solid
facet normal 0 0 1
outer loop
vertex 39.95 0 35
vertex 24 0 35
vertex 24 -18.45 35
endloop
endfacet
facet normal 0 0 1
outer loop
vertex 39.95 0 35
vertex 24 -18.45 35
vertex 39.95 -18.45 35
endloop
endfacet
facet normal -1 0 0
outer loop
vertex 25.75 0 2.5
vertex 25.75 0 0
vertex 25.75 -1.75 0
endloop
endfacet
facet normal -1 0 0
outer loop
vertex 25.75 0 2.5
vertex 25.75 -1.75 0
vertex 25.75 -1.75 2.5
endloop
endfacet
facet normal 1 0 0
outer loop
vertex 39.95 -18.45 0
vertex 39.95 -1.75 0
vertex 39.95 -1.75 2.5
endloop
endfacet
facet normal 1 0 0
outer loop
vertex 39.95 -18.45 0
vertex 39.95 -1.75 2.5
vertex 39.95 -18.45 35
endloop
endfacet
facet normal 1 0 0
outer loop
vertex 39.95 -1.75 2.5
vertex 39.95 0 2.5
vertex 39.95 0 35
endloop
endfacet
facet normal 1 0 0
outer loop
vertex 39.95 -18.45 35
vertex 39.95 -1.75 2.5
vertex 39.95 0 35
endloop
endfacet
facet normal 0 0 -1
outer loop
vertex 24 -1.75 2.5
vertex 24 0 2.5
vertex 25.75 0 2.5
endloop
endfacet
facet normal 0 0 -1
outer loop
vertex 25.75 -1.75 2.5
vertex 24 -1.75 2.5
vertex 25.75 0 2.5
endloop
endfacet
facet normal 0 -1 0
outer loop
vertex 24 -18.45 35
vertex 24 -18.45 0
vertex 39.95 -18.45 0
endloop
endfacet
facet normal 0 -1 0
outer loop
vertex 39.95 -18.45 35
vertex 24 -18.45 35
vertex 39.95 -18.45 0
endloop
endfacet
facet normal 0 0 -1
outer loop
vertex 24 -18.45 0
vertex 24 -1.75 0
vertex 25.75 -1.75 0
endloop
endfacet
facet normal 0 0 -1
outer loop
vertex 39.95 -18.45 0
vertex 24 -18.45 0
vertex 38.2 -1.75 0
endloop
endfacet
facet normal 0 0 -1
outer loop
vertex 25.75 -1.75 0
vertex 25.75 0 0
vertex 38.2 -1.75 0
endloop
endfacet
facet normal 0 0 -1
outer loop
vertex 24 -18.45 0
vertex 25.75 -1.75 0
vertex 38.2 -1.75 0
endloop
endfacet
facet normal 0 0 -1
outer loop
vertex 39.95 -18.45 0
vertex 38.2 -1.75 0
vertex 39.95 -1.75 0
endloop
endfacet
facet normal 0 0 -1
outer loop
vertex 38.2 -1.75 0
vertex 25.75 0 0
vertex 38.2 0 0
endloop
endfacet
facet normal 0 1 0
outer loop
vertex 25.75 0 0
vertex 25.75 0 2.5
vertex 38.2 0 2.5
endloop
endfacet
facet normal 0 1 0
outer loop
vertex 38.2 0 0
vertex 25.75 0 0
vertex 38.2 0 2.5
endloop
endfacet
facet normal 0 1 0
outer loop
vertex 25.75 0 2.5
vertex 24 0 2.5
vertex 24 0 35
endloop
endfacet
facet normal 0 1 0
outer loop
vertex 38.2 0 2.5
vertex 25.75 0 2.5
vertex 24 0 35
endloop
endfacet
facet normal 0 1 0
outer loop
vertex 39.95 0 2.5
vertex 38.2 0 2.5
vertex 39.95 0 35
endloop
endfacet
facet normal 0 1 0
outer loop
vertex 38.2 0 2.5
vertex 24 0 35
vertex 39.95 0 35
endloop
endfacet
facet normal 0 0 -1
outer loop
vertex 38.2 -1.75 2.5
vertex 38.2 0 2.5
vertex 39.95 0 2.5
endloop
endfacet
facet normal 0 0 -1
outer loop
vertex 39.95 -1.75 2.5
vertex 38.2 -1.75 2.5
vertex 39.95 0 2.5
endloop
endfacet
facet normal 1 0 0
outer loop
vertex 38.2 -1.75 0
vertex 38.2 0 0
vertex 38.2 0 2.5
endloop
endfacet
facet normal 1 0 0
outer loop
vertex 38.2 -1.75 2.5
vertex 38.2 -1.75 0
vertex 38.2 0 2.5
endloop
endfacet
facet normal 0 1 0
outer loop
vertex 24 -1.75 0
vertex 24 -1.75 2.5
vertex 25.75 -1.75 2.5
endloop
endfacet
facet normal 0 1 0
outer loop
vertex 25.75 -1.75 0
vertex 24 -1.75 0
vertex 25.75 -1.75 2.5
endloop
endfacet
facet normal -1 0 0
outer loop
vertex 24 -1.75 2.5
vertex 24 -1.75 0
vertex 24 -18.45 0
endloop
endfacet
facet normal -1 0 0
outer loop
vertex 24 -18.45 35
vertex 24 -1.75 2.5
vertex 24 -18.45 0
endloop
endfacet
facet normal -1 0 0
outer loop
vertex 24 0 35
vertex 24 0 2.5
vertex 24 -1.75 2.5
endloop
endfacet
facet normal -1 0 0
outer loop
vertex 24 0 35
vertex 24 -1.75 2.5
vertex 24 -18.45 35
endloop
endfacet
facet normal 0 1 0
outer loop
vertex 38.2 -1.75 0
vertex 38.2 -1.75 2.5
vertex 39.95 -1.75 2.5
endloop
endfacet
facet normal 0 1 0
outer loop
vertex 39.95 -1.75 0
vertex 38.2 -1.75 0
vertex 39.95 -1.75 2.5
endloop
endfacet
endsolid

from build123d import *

# Parameters (mm, degrees)
BOX006_W          = 1.75
BOX006_H          = 2.5
BOX006_DEPTH      = 1.75
BOX005_W          = 1.75
BOX005_H          = 2.5
BOX005_DEPTH      = 1.75
BOX004_W          = 15.95
BOX004_H          = 35
BOX004_DEPTH      = 18.45
CUT060_ROLL_ANGLE = 90


with BuildPart() as krychle005:
    # Box006 → Box006 (new body)
    with BuildSketch(Plane(origin=(14.2, 0, 0), x_dir=(1, 0, 0), z_dir=(0, 0, 1))):
        with Locations((0.875, 1.25)):
            Rectangle(BOX006_W, BOX006_H)
    extrude(amount=BOX006_DEPTH)


with BuildPart() as krychle004:
    # Box005 → Box005 (new body)
    with BuildSketch(Plane.XY):
        with Locations((0.875, 1.25)):
            Rectangle(BOX005_W, BOX005_H)
    extrude(amount=BOX005_DEPTH)


with BuildPart() as rj45:
    # Box004 → Box004 (new body)
    with BuildSketch(Plane.XY):
        with Locations((7.975, 17.5)):
            Rectangle(BOX004_W, BOX004_H)
    extrude(amount=BOX004_DEPTH)

    # Cut059: cut Krychle004
    add(krychle004.part, mode=Mode.SUBTRACT)

    # Cut060: cut Krychle005
    add(krychle005.part, mode=Mode.SUBTRACT)


with BuildPart() as rj45_1:
    # Cut060 roll: moved
    add(rj45.part.rotate(Axis((0, 0, 0), (1, 0, 0)), CUT060_ROLL_ANGLE))


with BuildPart() as rj45_2:
    # Cut060 placement: moved
    add(rj45_1.part.moved(Location((24, 0, 0))))


solid = rj45_2.part
